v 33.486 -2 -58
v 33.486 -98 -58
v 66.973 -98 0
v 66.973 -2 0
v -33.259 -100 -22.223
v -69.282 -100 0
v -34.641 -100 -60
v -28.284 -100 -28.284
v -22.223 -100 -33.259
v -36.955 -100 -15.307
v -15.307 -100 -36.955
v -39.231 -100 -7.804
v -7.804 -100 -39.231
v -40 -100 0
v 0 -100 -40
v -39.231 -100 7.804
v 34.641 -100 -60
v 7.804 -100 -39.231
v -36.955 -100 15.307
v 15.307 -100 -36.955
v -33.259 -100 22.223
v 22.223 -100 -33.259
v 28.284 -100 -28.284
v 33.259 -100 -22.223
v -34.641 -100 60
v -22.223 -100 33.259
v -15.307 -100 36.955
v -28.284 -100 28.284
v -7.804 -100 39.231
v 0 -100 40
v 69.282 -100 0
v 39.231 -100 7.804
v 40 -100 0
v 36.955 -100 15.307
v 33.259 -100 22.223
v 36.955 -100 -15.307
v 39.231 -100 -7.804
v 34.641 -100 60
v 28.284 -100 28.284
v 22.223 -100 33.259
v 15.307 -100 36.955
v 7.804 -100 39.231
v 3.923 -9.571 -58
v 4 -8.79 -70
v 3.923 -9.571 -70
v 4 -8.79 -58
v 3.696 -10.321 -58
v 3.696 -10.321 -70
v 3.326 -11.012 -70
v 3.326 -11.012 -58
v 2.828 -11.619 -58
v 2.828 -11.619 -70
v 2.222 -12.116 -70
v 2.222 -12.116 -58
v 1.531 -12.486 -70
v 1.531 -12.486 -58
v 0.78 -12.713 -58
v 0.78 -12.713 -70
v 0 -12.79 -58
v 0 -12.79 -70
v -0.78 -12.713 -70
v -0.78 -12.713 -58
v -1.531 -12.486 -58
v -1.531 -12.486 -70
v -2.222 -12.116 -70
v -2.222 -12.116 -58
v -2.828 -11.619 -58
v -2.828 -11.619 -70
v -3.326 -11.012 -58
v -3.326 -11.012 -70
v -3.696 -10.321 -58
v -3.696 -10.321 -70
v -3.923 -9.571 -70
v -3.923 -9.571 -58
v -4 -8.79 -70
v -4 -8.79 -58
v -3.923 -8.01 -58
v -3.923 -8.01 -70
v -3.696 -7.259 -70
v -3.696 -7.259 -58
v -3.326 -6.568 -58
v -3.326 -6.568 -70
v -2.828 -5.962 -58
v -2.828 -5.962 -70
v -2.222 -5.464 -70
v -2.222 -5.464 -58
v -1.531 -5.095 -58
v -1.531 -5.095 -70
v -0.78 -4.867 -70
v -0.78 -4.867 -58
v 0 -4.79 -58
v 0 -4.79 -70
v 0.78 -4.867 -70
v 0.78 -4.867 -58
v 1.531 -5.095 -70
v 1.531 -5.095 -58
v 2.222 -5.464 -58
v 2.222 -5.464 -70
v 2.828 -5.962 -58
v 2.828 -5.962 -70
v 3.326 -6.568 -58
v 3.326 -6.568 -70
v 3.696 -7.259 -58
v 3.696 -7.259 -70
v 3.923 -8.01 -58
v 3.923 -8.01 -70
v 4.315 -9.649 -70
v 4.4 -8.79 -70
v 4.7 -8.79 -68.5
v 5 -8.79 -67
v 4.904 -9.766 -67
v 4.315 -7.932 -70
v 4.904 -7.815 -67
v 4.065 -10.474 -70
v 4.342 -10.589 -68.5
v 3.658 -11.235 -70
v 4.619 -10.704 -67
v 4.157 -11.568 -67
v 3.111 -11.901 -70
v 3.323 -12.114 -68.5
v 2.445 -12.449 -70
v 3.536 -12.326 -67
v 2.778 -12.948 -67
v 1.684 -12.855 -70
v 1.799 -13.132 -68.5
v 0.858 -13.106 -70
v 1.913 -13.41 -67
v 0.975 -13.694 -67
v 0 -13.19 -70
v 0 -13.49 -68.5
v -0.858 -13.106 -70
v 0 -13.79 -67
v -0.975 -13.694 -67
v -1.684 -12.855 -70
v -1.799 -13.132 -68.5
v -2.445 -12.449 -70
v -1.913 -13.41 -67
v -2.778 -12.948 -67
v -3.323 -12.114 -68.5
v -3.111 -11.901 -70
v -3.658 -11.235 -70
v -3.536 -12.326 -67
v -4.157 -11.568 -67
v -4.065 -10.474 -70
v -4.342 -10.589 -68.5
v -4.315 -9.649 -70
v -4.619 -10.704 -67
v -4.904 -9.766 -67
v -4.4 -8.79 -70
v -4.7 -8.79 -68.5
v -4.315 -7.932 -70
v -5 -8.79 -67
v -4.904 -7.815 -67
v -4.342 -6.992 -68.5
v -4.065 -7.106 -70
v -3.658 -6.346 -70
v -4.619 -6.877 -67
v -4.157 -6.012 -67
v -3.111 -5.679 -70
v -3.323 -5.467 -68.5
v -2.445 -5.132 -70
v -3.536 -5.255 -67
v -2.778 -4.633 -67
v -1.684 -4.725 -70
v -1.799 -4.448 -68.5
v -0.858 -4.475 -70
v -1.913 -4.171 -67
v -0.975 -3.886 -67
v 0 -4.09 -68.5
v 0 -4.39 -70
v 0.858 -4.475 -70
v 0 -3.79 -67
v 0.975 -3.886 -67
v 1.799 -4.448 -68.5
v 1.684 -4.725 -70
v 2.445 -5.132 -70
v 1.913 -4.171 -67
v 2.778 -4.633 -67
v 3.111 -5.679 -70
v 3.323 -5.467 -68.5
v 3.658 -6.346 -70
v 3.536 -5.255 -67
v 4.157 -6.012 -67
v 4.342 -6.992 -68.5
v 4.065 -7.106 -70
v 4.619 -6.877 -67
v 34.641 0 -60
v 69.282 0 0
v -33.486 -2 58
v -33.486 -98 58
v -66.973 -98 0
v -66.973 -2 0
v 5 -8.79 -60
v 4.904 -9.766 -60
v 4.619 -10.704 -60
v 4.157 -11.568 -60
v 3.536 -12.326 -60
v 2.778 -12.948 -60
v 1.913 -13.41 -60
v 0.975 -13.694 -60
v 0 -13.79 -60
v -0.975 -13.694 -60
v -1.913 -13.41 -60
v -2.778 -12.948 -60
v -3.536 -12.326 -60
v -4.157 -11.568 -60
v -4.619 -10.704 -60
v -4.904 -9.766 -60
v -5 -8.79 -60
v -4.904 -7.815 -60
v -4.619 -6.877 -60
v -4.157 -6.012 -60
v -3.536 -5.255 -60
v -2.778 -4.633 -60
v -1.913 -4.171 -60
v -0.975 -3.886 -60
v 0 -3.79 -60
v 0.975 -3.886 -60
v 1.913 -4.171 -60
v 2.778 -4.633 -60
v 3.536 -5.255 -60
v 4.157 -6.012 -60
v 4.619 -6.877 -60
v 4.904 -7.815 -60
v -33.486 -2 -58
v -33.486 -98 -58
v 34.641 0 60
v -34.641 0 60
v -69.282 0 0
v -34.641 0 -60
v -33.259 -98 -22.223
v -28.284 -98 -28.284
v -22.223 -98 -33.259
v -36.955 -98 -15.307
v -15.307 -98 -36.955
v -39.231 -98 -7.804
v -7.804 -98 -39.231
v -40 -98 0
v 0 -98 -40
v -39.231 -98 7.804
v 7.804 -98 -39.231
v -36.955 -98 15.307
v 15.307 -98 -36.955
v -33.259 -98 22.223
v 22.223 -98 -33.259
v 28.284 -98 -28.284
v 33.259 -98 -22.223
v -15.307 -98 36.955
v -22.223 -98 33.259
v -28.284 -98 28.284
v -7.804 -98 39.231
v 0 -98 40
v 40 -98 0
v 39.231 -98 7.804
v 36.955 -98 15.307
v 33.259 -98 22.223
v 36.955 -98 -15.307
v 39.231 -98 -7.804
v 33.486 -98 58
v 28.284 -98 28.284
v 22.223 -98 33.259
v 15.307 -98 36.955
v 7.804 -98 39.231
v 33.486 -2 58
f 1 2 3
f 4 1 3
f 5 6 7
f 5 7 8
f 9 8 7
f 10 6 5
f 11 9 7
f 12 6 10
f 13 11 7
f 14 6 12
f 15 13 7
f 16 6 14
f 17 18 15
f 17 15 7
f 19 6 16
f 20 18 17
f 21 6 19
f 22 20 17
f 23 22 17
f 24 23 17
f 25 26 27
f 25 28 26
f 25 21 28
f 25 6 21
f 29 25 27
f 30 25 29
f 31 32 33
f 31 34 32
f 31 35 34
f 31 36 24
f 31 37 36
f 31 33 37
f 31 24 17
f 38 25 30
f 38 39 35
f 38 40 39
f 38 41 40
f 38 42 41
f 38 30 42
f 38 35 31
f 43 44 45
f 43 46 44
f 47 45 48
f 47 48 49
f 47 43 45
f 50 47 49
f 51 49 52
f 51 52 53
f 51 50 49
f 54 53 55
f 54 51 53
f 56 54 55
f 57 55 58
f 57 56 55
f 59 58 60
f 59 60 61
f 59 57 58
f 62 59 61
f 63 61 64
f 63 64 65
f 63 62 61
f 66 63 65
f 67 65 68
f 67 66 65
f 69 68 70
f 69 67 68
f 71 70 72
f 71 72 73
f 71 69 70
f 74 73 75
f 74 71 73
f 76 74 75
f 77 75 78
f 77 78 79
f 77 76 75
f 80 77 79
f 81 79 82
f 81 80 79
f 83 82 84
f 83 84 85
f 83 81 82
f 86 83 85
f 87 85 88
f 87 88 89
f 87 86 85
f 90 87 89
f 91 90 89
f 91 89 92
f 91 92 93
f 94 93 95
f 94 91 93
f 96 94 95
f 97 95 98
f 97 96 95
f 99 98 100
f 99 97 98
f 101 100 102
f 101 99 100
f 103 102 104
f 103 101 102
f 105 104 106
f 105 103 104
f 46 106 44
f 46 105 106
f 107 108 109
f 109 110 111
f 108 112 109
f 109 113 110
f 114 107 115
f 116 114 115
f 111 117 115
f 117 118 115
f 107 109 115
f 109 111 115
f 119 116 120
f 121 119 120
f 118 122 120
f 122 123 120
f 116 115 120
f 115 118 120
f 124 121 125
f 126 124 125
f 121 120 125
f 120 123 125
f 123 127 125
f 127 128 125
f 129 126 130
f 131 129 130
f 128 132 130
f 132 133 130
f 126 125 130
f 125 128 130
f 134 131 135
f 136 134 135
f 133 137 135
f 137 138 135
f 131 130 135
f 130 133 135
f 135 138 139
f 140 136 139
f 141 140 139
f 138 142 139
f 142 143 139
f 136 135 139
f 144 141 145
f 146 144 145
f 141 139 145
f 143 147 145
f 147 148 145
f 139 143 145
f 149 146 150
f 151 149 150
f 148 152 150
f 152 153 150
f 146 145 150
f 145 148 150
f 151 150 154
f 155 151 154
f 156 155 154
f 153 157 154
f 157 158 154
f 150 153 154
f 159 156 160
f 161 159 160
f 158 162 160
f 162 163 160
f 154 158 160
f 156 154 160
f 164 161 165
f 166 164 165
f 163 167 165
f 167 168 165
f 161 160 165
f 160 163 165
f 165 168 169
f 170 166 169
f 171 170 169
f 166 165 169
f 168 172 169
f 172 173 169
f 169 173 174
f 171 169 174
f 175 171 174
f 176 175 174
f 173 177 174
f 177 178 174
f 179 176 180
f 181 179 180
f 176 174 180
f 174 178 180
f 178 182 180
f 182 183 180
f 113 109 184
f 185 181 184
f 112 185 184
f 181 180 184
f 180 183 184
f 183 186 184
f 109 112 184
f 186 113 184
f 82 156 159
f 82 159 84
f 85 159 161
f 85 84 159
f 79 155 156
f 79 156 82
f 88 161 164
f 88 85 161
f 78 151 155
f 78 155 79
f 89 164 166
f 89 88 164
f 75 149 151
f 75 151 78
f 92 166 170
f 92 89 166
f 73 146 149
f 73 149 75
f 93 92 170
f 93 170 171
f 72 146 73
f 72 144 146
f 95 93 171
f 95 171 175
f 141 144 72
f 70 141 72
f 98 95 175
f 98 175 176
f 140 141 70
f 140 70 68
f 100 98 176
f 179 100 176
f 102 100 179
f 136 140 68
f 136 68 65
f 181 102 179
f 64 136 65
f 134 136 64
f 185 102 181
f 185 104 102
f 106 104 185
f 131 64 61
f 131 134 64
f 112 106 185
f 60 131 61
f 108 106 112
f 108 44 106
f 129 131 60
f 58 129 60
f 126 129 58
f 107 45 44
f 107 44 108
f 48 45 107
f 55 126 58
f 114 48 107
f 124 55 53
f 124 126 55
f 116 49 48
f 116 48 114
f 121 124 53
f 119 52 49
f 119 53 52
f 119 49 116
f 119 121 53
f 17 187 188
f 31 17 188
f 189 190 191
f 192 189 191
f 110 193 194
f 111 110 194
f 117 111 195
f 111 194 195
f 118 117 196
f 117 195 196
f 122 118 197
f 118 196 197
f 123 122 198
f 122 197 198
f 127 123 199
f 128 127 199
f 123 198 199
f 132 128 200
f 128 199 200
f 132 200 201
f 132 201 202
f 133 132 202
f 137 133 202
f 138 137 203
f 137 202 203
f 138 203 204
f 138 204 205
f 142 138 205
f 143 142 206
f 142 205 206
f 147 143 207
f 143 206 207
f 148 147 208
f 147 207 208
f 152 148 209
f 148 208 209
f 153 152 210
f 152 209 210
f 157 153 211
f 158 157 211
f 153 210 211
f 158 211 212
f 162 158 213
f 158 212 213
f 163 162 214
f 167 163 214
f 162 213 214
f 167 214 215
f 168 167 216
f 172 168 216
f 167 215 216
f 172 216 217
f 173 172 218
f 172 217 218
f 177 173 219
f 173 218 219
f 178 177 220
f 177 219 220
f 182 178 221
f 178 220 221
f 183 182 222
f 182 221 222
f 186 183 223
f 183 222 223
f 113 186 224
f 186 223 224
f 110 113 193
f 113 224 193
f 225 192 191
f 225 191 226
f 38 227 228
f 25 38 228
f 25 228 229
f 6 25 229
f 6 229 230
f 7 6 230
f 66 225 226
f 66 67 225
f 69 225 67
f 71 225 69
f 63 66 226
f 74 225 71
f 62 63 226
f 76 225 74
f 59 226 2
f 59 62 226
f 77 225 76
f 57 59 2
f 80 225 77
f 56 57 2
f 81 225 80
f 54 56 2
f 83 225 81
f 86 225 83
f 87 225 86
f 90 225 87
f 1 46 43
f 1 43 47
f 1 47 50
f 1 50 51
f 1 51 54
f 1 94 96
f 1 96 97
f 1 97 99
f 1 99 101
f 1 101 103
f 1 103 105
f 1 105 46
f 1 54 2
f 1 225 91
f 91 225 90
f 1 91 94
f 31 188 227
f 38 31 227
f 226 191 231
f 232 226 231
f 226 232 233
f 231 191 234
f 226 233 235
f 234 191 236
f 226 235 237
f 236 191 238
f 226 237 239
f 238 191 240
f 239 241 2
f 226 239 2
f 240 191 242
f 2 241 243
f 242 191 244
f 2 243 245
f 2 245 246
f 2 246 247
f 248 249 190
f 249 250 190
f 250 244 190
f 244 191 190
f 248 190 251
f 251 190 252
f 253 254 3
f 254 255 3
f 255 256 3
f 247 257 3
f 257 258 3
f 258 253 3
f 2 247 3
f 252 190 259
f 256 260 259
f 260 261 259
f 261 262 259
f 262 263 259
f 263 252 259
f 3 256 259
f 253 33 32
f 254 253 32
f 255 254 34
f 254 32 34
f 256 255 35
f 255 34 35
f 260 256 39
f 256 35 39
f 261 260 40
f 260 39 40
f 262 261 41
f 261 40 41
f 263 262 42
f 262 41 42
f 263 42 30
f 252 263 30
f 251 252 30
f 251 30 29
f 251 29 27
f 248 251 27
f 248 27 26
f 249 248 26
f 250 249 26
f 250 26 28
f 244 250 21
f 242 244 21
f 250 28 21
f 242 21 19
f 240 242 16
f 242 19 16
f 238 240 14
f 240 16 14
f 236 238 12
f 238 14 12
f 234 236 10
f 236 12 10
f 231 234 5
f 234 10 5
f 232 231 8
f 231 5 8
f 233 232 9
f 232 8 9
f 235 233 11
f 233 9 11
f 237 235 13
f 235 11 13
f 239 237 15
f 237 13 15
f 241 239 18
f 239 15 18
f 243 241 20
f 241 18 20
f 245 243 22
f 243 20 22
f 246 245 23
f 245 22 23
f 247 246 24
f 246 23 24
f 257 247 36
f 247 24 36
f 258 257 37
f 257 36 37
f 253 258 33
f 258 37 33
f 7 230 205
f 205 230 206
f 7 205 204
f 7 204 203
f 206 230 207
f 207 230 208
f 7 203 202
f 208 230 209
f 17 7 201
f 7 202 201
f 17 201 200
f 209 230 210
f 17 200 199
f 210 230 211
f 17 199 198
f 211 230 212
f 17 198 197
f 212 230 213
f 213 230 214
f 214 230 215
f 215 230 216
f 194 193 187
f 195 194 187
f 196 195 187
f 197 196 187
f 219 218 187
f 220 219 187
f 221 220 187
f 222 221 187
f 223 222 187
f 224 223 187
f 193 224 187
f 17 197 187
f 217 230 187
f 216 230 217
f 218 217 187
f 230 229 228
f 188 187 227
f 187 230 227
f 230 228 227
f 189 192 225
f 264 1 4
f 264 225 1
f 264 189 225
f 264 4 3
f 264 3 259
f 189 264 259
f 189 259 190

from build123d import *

# Parameters (mm, degrees)
F1_DEPTH = 100
F2_T     = -2
F3_R     = 40
F4_DEPTH = 2
F5_R     = 4
F6_DEPTH = 2
F5_R_2   = 5
F7_DEPTH = 10
F8_SIZE2 = 3
F8_SIZE  = 0.6


with BuildPart() as f1:
    # F0 (on Front) → F1 (new body)
    with BuildSketch(Plane.XZ):
        Polygon((34.6410161514, -60), (69.2820323028, 0), (34.6410161514, 60), (-34.6410161514, 60), (-69.2820323028, 0), (-34.6410161514, -60), align=None)
    extrude(amount=F1_DEPTH)

    # F2
    f2_openings = [f1.faces().sort_by_distance(p)[0] for p in [
        (0, -100, 0),
    ]]
    offset(amount=F2_T, openings=f2_openings)

    # F3 (on face) → F4 (join)
    with BuildSketch(Plane.XZ.offset(100)):
        Polygon((-33.486315613, -58), (33.486315613, -58), (66.972631226, 0), (33.486315613, 58), (-33.486315613, 58), (-66.972631226, 0), align=None)
        Circle(F3_R, mode=Mode.SUBTRACT)
    extrude(amount=-F4_DEPTH)

    # F5 (on face) → F6 (cut, through all)
    with BuildSketch(Plane(origin=(0, 0, -60), x_dir=(1, 0, 0), z_dir=(0, 0, -1))):
        with Locations((0, 8.7902189698)):
            Circle(F5_R)
    extrude(amount=-F6_DEPTH, mode=Mode.SUBTRACT)

    # F5 (on face) → F7 (join)
    with BuildSketch(Plane(origin=(0, 0, -60), x_dir=(1, 0, 0), z_dir=(0, 0, -1))):
        with Locations((0, 8.7902189698)):
            Circle(F5_R_2)
        with Locations((0, 8.7902189698)):
            Circle(F5_R, mode=Mode.SUBTRACT)
    extrude(amount=F7_DEPTH)

    # F8
    f8_edges = [f1.edges().sort_by_distance(p)[0] for p in [
        (-5, -8.790219, -70),
    ]]
    f8_side = f1.faces().sort_by_distance((-4.858579, -8.790219, -70))[0]
    chamfer(f8_edges, length=F8_SIZE, length2=F8_SIZE2, reference=f8_side)


solid = f1.part
